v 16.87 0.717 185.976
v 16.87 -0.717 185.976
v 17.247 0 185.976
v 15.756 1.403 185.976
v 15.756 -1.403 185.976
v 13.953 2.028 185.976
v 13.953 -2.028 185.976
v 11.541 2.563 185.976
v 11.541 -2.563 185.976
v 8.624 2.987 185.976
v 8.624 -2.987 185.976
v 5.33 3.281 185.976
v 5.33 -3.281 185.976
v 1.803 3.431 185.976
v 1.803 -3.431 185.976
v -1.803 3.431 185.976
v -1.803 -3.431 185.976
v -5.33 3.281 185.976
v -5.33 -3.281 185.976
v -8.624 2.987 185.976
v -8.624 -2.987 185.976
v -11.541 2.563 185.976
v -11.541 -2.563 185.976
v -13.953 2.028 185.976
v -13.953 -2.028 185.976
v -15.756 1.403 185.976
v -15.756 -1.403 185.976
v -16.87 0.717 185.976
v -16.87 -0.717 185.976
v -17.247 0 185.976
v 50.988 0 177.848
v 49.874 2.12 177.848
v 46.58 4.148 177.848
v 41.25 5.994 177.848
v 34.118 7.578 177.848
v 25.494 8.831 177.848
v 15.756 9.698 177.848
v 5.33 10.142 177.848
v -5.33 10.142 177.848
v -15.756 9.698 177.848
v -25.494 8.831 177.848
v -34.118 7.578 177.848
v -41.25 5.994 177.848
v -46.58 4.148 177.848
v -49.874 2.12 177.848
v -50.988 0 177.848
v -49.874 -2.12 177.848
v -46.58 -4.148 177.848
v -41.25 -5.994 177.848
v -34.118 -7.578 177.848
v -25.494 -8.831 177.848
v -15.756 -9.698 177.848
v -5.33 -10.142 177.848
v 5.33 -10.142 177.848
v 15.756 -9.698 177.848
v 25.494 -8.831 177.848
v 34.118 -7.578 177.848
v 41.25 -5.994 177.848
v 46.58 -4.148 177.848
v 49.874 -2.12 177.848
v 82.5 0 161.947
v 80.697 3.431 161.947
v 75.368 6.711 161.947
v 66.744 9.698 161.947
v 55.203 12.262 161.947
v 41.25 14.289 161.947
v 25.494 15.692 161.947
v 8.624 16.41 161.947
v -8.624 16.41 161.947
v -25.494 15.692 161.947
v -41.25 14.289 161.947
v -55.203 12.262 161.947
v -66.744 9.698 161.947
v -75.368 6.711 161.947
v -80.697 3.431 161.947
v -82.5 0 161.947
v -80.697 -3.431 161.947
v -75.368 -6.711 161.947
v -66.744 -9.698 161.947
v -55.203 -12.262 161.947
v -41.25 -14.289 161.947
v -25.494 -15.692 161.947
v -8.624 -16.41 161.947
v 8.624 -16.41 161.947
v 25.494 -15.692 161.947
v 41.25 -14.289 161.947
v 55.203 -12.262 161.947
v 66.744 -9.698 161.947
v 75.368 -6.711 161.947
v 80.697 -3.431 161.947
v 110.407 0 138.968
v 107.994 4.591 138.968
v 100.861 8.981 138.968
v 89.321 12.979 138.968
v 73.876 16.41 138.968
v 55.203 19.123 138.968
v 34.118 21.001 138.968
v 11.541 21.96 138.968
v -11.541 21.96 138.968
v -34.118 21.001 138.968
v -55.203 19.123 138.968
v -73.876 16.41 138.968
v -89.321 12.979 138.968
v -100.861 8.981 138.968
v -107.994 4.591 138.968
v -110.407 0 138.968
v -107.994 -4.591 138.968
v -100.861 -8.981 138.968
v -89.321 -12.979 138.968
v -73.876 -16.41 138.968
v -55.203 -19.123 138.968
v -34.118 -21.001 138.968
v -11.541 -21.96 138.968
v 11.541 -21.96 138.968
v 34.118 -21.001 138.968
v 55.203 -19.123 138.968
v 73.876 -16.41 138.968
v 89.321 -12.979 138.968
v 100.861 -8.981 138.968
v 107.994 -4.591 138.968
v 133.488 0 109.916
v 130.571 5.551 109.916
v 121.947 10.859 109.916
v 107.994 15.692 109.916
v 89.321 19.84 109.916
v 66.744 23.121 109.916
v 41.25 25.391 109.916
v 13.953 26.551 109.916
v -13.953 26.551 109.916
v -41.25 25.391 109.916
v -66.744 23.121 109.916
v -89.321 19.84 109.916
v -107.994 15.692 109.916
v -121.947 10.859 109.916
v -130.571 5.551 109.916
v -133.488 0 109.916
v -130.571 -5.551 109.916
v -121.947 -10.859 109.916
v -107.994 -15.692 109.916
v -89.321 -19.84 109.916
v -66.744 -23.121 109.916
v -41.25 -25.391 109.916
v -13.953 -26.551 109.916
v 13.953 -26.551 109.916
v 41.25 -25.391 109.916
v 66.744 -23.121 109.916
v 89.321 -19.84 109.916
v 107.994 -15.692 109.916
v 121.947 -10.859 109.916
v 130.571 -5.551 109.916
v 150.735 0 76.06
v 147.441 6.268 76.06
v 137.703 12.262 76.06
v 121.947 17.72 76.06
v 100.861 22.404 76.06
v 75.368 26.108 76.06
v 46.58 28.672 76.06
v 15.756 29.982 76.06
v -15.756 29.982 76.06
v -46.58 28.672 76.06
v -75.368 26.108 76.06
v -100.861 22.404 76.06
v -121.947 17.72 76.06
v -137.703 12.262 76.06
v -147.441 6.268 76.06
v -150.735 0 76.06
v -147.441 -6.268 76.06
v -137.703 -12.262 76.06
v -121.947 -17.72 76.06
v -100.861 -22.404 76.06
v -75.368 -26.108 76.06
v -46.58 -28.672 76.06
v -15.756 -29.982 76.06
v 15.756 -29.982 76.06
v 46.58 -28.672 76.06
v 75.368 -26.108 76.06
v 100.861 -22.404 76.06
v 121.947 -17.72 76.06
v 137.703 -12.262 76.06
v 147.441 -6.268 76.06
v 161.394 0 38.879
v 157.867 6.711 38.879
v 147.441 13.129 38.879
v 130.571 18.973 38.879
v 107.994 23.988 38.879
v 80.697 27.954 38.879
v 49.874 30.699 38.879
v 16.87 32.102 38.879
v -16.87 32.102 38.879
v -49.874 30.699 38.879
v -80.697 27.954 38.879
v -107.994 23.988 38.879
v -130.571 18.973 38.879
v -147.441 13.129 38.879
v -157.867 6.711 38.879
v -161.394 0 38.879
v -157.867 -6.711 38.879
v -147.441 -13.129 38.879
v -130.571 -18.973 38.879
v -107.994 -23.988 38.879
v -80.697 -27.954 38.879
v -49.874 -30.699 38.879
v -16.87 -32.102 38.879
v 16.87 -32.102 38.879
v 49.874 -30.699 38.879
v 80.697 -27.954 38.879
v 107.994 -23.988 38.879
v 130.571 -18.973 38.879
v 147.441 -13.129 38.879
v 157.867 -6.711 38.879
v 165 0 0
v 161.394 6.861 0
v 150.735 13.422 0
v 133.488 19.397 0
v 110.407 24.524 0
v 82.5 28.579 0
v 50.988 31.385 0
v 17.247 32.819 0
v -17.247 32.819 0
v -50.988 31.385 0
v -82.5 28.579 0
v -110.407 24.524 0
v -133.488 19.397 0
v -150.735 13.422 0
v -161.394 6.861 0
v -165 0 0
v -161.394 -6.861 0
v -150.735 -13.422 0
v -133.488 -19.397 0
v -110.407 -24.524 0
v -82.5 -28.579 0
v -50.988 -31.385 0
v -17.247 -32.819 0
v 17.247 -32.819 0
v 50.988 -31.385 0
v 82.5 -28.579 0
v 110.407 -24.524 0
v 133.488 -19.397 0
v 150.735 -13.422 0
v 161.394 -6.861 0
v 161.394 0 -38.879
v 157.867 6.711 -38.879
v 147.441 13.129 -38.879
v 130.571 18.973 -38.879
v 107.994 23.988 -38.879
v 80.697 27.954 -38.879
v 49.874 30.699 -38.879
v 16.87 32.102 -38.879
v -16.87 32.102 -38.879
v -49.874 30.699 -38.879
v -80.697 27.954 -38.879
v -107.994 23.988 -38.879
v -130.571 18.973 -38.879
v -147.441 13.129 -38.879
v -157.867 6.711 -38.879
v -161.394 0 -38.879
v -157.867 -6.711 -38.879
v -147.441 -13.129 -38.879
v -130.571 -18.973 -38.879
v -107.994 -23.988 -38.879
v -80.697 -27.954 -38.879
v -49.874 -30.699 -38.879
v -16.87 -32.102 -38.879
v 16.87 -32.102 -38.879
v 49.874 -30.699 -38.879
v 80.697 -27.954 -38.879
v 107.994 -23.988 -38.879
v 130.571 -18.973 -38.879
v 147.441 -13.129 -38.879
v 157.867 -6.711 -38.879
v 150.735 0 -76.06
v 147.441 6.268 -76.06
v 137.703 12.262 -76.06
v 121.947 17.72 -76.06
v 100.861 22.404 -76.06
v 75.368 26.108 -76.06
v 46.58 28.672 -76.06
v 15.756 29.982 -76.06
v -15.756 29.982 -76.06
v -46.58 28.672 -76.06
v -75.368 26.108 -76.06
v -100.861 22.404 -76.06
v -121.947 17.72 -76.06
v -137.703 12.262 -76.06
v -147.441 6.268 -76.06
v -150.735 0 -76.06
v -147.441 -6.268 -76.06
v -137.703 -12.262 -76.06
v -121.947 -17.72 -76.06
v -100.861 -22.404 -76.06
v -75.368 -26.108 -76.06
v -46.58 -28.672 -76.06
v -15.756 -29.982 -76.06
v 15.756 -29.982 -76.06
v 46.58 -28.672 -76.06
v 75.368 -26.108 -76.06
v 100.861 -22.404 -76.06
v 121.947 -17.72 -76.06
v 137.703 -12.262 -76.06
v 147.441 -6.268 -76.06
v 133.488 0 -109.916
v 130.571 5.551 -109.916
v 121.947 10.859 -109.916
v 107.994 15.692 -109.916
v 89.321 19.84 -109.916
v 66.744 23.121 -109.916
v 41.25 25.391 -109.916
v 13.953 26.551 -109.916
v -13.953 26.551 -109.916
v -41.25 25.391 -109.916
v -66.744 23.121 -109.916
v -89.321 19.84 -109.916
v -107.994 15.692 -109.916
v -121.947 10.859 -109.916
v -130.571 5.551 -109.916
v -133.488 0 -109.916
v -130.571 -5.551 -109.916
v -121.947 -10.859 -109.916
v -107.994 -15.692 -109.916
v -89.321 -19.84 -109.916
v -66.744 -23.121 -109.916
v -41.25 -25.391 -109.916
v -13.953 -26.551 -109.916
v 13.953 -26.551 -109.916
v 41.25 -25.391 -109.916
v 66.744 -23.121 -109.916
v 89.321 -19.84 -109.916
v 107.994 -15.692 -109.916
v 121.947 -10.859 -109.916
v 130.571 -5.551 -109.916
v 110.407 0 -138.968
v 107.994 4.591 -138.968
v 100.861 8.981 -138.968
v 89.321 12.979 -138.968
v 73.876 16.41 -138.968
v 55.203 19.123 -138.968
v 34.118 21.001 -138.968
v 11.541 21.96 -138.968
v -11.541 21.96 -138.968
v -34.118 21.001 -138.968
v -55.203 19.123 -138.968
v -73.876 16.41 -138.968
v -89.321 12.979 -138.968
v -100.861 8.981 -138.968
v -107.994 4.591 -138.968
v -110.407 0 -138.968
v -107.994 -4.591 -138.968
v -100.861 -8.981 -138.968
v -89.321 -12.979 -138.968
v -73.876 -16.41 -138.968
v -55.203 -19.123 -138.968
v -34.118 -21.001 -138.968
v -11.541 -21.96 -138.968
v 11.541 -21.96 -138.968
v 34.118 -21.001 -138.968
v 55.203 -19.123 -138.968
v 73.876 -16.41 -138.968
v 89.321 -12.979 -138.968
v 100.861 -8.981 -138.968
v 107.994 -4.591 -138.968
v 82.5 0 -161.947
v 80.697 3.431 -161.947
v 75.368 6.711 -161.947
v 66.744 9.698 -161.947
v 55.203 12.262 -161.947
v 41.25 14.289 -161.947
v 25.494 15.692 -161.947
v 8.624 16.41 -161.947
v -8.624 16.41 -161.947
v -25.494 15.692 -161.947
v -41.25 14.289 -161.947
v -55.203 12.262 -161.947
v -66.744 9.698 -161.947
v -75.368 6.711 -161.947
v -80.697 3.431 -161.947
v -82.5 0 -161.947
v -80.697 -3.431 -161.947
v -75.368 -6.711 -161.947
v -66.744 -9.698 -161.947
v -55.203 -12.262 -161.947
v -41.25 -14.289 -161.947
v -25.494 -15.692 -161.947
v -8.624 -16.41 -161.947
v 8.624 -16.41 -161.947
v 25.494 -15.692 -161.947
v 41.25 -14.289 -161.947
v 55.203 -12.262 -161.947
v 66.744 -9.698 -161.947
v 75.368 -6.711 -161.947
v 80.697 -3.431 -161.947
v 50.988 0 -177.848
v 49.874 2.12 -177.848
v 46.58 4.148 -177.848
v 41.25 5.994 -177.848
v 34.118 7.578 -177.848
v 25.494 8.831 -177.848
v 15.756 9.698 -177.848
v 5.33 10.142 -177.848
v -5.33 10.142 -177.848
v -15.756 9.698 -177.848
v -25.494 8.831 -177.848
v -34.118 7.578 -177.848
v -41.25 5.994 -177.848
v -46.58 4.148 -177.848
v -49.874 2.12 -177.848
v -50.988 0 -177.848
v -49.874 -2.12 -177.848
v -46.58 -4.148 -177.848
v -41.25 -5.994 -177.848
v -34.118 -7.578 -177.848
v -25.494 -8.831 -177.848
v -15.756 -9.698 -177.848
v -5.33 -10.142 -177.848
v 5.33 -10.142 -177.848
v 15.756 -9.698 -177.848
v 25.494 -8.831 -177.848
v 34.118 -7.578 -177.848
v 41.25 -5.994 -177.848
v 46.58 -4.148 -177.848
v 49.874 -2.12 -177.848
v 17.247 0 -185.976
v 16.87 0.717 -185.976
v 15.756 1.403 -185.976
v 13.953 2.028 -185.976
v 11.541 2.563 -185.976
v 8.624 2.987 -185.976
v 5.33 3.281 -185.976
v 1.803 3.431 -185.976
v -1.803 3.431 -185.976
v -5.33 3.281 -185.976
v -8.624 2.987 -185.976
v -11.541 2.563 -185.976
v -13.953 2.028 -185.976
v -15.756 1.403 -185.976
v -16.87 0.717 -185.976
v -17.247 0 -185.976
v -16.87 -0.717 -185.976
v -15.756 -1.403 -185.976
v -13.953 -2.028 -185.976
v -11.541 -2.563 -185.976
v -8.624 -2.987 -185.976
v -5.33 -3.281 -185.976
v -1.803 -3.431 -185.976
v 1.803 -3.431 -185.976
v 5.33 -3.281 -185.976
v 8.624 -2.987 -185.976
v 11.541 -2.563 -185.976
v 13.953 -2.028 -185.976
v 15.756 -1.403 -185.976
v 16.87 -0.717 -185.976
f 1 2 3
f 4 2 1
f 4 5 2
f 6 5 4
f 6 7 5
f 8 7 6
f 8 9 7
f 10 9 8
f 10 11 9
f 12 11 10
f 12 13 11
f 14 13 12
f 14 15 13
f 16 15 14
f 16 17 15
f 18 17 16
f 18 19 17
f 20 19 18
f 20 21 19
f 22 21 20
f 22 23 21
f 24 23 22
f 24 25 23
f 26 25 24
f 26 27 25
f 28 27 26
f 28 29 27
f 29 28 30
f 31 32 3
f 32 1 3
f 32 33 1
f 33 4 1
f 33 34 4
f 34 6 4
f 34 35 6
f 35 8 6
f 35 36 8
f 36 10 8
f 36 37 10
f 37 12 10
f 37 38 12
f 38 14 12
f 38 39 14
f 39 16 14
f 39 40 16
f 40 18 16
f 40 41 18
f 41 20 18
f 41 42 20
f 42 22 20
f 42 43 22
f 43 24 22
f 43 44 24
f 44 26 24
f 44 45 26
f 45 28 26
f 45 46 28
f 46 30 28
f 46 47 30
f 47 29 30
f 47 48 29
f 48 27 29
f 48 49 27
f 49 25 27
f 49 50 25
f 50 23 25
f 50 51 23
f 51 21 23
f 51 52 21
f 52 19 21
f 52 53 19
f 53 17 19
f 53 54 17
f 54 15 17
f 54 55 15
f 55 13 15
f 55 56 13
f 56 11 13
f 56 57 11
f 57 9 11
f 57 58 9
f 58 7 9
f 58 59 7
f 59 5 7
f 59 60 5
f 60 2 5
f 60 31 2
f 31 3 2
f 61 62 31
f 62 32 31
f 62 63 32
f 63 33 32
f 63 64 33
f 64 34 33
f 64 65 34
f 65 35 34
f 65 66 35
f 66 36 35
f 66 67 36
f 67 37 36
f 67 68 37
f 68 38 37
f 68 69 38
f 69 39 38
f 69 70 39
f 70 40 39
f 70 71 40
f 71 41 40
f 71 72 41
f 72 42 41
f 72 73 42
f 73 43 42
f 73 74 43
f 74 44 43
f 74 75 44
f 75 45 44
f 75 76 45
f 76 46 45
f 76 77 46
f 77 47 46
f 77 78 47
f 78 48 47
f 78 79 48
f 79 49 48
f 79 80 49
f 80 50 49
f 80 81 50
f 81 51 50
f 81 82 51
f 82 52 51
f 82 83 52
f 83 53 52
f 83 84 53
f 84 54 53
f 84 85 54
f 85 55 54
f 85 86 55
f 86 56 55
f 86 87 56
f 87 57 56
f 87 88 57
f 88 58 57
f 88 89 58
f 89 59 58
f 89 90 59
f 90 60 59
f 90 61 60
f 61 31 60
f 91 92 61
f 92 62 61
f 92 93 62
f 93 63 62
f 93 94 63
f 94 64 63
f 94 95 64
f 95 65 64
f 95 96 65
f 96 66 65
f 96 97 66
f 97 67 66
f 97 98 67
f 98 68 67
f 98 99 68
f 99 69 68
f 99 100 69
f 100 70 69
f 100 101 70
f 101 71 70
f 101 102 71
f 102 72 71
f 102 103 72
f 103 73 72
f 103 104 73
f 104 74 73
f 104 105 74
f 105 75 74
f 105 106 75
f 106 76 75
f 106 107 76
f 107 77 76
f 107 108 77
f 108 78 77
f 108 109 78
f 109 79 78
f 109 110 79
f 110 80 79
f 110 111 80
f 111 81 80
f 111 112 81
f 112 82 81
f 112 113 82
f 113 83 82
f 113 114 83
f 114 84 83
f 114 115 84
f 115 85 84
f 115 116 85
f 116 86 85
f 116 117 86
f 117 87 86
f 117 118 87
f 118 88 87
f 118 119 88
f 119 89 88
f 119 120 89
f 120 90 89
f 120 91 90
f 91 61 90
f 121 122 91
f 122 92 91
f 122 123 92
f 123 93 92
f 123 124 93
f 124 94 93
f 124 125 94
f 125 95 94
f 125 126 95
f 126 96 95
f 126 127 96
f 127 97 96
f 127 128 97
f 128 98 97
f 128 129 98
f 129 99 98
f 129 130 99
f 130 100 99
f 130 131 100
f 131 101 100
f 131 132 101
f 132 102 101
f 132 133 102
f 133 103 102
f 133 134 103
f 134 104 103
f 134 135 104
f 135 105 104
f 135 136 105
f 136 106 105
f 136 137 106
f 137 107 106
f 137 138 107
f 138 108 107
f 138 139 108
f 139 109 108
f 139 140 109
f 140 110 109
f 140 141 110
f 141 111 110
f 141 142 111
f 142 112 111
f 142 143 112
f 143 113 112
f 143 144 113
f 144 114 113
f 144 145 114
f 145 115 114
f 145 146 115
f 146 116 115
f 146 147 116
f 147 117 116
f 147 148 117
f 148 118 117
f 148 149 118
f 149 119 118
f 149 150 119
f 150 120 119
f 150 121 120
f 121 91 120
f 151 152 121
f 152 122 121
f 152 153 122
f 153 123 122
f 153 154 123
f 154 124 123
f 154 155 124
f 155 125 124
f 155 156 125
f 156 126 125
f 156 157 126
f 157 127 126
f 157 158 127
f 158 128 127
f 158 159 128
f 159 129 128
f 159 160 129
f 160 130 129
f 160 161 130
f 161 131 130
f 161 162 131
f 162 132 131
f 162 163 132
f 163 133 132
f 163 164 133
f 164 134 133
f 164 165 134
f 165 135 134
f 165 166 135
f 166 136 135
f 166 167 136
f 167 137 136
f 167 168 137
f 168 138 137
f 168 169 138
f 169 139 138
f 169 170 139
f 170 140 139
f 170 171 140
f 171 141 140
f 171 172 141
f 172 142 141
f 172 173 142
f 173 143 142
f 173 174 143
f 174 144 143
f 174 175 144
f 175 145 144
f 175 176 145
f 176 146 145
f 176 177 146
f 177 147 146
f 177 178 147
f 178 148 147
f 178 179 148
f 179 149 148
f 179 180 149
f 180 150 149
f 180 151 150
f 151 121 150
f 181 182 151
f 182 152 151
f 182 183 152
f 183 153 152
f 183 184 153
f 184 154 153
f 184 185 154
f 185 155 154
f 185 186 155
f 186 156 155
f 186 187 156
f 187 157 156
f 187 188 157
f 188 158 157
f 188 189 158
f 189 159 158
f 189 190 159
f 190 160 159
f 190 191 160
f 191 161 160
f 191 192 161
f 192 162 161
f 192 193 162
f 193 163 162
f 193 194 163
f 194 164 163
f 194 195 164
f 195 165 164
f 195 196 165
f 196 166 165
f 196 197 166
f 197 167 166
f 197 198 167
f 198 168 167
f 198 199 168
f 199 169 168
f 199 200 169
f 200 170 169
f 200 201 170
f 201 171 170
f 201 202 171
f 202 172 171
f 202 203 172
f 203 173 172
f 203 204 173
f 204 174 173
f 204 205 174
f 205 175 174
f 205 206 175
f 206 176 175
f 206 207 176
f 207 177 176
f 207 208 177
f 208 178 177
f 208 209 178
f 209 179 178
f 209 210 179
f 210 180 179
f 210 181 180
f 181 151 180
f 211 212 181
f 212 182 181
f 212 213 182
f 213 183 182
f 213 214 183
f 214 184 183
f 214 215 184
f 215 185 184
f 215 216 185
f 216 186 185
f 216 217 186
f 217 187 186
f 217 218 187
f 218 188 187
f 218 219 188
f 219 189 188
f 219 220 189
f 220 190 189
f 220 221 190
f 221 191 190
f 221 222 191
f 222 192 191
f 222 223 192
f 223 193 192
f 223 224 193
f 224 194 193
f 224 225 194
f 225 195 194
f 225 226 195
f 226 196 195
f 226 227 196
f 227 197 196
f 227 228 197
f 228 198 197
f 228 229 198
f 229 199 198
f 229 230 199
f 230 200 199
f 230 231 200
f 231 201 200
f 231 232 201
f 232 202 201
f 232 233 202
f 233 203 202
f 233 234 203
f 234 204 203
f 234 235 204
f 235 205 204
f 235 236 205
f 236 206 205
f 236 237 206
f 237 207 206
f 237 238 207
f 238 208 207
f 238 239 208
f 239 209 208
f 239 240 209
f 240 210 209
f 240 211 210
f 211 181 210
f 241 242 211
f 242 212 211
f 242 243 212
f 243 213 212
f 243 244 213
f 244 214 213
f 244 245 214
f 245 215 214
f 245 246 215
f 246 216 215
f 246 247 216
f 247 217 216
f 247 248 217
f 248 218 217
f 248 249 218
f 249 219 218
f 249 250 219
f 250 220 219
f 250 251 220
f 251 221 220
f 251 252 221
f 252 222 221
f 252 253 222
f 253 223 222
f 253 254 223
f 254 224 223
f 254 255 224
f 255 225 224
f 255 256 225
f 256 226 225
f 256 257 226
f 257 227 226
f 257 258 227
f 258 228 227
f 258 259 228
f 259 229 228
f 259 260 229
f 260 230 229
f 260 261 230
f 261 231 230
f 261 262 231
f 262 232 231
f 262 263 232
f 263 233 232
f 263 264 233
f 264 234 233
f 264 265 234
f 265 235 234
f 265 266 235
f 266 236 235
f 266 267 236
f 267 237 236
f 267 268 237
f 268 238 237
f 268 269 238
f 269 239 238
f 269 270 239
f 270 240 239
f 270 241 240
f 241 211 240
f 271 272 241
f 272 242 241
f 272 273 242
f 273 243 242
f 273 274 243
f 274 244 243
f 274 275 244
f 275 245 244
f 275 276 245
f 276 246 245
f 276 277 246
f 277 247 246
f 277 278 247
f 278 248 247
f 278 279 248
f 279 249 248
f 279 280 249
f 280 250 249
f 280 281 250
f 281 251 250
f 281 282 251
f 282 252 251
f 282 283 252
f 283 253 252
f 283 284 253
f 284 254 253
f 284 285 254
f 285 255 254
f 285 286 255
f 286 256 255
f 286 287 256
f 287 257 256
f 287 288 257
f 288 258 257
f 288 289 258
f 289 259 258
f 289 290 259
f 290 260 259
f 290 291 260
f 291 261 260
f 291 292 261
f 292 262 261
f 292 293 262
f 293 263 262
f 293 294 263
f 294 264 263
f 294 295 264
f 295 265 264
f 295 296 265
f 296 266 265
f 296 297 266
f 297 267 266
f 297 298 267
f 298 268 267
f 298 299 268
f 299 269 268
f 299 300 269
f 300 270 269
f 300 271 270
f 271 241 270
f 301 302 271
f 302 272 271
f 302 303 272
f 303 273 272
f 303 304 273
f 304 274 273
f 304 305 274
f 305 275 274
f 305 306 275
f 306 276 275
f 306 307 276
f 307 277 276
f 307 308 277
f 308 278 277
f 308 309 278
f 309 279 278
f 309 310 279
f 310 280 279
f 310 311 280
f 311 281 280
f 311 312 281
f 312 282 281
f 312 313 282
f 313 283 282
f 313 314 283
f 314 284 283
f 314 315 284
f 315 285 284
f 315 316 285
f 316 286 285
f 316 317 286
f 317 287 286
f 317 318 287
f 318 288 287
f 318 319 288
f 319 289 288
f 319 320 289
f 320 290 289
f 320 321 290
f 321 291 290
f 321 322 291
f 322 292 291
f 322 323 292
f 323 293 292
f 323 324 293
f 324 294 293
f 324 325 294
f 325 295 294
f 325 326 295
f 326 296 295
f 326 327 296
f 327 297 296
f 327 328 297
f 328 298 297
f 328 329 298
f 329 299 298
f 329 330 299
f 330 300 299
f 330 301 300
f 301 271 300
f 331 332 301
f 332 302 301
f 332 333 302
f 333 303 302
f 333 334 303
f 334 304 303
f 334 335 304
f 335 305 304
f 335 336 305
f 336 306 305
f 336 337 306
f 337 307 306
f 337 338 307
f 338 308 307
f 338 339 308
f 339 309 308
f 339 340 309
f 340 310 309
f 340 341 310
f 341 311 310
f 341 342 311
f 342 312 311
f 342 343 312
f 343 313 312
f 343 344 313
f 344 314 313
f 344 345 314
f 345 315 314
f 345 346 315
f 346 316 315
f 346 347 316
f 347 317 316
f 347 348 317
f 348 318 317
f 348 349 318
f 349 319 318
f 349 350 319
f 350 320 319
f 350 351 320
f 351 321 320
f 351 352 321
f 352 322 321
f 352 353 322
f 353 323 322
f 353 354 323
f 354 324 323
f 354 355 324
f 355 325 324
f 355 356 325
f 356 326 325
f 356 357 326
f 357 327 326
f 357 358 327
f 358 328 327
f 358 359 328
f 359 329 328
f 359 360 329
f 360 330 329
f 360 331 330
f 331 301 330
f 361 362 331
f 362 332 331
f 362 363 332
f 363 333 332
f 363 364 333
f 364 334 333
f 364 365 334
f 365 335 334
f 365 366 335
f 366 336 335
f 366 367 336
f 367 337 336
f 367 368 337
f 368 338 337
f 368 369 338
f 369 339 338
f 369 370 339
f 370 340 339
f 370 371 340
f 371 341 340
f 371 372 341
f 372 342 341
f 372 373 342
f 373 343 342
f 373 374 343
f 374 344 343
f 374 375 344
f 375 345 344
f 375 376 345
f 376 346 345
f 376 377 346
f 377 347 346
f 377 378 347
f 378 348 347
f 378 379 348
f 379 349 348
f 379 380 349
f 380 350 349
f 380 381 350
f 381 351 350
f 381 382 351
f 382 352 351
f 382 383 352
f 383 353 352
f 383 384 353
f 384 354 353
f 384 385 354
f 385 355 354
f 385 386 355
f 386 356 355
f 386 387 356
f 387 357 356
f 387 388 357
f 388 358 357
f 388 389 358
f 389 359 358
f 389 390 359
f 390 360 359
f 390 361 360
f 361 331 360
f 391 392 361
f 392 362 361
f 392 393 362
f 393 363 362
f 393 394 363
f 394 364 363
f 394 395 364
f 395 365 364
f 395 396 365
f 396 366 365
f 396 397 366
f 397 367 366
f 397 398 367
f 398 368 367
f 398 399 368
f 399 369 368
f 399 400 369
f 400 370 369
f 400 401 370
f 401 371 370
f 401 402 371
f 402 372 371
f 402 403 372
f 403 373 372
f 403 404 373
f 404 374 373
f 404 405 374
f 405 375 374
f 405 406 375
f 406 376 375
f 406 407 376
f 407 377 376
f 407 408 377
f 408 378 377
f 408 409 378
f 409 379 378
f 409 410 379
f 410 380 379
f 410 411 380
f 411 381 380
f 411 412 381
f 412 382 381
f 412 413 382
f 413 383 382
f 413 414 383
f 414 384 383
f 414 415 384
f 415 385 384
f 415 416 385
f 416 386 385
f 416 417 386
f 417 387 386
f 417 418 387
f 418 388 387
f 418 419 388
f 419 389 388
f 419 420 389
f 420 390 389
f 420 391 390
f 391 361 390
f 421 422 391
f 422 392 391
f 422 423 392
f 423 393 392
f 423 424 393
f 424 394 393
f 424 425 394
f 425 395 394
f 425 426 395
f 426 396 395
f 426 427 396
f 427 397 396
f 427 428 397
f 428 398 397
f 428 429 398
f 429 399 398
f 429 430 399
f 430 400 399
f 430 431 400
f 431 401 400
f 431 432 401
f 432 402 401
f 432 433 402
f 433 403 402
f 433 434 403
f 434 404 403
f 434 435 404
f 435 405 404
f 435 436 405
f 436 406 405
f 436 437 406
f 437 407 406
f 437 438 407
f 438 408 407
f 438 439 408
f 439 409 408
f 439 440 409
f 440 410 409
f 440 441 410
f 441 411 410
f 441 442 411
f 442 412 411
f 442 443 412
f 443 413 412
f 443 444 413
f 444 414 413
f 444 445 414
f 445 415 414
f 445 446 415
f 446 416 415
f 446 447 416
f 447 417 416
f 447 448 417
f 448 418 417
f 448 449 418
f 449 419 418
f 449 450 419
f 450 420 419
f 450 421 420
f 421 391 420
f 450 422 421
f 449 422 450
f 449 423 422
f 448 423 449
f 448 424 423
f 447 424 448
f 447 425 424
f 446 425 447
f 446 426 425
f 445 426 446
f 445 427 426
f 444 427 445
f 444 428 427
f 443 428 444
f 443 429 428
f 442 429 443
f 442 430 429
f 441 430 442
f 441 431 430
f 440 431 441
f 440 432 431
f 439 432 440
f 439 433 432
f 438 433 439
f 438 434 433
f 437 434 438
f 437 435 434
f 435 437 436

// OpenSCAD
// Generated by SolidPython 1.0.1 on 2020-07-29 00:46:51


scale(v = [15, 3, 17]) {
	sphere(r = 11);
}
/***********************************************
*********      SolidPython code:      **********
************************************************
 
# import packages: SolidPython
from solid import *
from solid.utils import *
from itertools import chain, combinations, permutations


class Resize:

    def __init__(self, scad_file):
        self.scad_file = scad_file
        #self.scad_file = import_scad(scad_file)
        # cone/cylinder param:
        self.r1 = 0
        self.r2 = 0
        self.h = 0
        # rectangular prism param:
        self.w = 0
        self.l = 0
        # ellipse param:
        self.r = 0

    # import OpenScad code (file name corresponds to shape)


    # classify shape + parameters
    def assign(self, param1, param2, param3):
        if self.scad_file == 'cone.scad':
            self.r1 = param1
            self.r2 = param2
            self.h = param3
        elif self.scad_file == 'cylinder.scad':
            self.r1 = param1
            self.r2 = param2
            self.h = param3
        elif self.scad_file == 'rectangularPrism.scad':
            self.h = param1
            self.l = param2
            self.w = param3
        else:
            self.r = param1
            self.h = param2

    # resize parameters
    def iterate(self):
        x = range(3, 20, 2)
        i = 1
        if self.scad_file == 'cone.scad':
            tempList = list(permutations(x, 2))
            for temp in tempList:
                param1 = temp[0]
                param2 = temp[1]
                filepath = 'produced_scad_files/' + 'cone' + str(param1) + '_' + str(param2) + '_' + '.scad'
                scad_render_to_file(cylinder(h=param1, r1=param2, r2=0), filepath)

        elif self.scad_file == 'cylinder.scad':
            tempList = list(permutations(x, 3))
            for temp in tempList:
                param1 = temp[0]
                param2 = temp[1]
                filepath = 'produced_scad_files/' + 'cylinder' + str(param1) + '_' + str(param2) + '_' + '.scad'
                scad_render_to_file(cylinder(h=param1, r1=param2, r2=param2), filepath)

        elif self.scad_file == 'rectangularPrism.scad':
            tempList = list(permutations(x, 3))
            for temp in tempList:
                param1 = temp[0]
                param2 = temp[1]
                param3 = temp[2]
                filepath = 'produced_scad_files/' + 'rectangularPrism' + str(param1) + '_' + str(param2) + '_' + str(
                    param3) + '.scad'
                scad_render_to_file(cube(size=(param1, param2, param3)), filepath)

        elif self.scad_file == 'ellipse.scad':
            tempList = list(permutations(x, 4))
            for temp in tempList:
                param1 = temp[0]
                param2 = temp[1]
                param3 = temp[2]
                param4 = temp[3]
                filepath = 'produced_scad_files/' + 'ellipse' + str(param1) + '_' + str(param2) + '_' + str(param3) + '_' + str(param4) + '.scad'
                scad_render_to_file(scale([param1, param2, param3])(sphere(r=param4)), filepath)

    def render_to_scadfile(self):
        scad_render_to_file(scad, 'example.scad') 
 
************************************************/
